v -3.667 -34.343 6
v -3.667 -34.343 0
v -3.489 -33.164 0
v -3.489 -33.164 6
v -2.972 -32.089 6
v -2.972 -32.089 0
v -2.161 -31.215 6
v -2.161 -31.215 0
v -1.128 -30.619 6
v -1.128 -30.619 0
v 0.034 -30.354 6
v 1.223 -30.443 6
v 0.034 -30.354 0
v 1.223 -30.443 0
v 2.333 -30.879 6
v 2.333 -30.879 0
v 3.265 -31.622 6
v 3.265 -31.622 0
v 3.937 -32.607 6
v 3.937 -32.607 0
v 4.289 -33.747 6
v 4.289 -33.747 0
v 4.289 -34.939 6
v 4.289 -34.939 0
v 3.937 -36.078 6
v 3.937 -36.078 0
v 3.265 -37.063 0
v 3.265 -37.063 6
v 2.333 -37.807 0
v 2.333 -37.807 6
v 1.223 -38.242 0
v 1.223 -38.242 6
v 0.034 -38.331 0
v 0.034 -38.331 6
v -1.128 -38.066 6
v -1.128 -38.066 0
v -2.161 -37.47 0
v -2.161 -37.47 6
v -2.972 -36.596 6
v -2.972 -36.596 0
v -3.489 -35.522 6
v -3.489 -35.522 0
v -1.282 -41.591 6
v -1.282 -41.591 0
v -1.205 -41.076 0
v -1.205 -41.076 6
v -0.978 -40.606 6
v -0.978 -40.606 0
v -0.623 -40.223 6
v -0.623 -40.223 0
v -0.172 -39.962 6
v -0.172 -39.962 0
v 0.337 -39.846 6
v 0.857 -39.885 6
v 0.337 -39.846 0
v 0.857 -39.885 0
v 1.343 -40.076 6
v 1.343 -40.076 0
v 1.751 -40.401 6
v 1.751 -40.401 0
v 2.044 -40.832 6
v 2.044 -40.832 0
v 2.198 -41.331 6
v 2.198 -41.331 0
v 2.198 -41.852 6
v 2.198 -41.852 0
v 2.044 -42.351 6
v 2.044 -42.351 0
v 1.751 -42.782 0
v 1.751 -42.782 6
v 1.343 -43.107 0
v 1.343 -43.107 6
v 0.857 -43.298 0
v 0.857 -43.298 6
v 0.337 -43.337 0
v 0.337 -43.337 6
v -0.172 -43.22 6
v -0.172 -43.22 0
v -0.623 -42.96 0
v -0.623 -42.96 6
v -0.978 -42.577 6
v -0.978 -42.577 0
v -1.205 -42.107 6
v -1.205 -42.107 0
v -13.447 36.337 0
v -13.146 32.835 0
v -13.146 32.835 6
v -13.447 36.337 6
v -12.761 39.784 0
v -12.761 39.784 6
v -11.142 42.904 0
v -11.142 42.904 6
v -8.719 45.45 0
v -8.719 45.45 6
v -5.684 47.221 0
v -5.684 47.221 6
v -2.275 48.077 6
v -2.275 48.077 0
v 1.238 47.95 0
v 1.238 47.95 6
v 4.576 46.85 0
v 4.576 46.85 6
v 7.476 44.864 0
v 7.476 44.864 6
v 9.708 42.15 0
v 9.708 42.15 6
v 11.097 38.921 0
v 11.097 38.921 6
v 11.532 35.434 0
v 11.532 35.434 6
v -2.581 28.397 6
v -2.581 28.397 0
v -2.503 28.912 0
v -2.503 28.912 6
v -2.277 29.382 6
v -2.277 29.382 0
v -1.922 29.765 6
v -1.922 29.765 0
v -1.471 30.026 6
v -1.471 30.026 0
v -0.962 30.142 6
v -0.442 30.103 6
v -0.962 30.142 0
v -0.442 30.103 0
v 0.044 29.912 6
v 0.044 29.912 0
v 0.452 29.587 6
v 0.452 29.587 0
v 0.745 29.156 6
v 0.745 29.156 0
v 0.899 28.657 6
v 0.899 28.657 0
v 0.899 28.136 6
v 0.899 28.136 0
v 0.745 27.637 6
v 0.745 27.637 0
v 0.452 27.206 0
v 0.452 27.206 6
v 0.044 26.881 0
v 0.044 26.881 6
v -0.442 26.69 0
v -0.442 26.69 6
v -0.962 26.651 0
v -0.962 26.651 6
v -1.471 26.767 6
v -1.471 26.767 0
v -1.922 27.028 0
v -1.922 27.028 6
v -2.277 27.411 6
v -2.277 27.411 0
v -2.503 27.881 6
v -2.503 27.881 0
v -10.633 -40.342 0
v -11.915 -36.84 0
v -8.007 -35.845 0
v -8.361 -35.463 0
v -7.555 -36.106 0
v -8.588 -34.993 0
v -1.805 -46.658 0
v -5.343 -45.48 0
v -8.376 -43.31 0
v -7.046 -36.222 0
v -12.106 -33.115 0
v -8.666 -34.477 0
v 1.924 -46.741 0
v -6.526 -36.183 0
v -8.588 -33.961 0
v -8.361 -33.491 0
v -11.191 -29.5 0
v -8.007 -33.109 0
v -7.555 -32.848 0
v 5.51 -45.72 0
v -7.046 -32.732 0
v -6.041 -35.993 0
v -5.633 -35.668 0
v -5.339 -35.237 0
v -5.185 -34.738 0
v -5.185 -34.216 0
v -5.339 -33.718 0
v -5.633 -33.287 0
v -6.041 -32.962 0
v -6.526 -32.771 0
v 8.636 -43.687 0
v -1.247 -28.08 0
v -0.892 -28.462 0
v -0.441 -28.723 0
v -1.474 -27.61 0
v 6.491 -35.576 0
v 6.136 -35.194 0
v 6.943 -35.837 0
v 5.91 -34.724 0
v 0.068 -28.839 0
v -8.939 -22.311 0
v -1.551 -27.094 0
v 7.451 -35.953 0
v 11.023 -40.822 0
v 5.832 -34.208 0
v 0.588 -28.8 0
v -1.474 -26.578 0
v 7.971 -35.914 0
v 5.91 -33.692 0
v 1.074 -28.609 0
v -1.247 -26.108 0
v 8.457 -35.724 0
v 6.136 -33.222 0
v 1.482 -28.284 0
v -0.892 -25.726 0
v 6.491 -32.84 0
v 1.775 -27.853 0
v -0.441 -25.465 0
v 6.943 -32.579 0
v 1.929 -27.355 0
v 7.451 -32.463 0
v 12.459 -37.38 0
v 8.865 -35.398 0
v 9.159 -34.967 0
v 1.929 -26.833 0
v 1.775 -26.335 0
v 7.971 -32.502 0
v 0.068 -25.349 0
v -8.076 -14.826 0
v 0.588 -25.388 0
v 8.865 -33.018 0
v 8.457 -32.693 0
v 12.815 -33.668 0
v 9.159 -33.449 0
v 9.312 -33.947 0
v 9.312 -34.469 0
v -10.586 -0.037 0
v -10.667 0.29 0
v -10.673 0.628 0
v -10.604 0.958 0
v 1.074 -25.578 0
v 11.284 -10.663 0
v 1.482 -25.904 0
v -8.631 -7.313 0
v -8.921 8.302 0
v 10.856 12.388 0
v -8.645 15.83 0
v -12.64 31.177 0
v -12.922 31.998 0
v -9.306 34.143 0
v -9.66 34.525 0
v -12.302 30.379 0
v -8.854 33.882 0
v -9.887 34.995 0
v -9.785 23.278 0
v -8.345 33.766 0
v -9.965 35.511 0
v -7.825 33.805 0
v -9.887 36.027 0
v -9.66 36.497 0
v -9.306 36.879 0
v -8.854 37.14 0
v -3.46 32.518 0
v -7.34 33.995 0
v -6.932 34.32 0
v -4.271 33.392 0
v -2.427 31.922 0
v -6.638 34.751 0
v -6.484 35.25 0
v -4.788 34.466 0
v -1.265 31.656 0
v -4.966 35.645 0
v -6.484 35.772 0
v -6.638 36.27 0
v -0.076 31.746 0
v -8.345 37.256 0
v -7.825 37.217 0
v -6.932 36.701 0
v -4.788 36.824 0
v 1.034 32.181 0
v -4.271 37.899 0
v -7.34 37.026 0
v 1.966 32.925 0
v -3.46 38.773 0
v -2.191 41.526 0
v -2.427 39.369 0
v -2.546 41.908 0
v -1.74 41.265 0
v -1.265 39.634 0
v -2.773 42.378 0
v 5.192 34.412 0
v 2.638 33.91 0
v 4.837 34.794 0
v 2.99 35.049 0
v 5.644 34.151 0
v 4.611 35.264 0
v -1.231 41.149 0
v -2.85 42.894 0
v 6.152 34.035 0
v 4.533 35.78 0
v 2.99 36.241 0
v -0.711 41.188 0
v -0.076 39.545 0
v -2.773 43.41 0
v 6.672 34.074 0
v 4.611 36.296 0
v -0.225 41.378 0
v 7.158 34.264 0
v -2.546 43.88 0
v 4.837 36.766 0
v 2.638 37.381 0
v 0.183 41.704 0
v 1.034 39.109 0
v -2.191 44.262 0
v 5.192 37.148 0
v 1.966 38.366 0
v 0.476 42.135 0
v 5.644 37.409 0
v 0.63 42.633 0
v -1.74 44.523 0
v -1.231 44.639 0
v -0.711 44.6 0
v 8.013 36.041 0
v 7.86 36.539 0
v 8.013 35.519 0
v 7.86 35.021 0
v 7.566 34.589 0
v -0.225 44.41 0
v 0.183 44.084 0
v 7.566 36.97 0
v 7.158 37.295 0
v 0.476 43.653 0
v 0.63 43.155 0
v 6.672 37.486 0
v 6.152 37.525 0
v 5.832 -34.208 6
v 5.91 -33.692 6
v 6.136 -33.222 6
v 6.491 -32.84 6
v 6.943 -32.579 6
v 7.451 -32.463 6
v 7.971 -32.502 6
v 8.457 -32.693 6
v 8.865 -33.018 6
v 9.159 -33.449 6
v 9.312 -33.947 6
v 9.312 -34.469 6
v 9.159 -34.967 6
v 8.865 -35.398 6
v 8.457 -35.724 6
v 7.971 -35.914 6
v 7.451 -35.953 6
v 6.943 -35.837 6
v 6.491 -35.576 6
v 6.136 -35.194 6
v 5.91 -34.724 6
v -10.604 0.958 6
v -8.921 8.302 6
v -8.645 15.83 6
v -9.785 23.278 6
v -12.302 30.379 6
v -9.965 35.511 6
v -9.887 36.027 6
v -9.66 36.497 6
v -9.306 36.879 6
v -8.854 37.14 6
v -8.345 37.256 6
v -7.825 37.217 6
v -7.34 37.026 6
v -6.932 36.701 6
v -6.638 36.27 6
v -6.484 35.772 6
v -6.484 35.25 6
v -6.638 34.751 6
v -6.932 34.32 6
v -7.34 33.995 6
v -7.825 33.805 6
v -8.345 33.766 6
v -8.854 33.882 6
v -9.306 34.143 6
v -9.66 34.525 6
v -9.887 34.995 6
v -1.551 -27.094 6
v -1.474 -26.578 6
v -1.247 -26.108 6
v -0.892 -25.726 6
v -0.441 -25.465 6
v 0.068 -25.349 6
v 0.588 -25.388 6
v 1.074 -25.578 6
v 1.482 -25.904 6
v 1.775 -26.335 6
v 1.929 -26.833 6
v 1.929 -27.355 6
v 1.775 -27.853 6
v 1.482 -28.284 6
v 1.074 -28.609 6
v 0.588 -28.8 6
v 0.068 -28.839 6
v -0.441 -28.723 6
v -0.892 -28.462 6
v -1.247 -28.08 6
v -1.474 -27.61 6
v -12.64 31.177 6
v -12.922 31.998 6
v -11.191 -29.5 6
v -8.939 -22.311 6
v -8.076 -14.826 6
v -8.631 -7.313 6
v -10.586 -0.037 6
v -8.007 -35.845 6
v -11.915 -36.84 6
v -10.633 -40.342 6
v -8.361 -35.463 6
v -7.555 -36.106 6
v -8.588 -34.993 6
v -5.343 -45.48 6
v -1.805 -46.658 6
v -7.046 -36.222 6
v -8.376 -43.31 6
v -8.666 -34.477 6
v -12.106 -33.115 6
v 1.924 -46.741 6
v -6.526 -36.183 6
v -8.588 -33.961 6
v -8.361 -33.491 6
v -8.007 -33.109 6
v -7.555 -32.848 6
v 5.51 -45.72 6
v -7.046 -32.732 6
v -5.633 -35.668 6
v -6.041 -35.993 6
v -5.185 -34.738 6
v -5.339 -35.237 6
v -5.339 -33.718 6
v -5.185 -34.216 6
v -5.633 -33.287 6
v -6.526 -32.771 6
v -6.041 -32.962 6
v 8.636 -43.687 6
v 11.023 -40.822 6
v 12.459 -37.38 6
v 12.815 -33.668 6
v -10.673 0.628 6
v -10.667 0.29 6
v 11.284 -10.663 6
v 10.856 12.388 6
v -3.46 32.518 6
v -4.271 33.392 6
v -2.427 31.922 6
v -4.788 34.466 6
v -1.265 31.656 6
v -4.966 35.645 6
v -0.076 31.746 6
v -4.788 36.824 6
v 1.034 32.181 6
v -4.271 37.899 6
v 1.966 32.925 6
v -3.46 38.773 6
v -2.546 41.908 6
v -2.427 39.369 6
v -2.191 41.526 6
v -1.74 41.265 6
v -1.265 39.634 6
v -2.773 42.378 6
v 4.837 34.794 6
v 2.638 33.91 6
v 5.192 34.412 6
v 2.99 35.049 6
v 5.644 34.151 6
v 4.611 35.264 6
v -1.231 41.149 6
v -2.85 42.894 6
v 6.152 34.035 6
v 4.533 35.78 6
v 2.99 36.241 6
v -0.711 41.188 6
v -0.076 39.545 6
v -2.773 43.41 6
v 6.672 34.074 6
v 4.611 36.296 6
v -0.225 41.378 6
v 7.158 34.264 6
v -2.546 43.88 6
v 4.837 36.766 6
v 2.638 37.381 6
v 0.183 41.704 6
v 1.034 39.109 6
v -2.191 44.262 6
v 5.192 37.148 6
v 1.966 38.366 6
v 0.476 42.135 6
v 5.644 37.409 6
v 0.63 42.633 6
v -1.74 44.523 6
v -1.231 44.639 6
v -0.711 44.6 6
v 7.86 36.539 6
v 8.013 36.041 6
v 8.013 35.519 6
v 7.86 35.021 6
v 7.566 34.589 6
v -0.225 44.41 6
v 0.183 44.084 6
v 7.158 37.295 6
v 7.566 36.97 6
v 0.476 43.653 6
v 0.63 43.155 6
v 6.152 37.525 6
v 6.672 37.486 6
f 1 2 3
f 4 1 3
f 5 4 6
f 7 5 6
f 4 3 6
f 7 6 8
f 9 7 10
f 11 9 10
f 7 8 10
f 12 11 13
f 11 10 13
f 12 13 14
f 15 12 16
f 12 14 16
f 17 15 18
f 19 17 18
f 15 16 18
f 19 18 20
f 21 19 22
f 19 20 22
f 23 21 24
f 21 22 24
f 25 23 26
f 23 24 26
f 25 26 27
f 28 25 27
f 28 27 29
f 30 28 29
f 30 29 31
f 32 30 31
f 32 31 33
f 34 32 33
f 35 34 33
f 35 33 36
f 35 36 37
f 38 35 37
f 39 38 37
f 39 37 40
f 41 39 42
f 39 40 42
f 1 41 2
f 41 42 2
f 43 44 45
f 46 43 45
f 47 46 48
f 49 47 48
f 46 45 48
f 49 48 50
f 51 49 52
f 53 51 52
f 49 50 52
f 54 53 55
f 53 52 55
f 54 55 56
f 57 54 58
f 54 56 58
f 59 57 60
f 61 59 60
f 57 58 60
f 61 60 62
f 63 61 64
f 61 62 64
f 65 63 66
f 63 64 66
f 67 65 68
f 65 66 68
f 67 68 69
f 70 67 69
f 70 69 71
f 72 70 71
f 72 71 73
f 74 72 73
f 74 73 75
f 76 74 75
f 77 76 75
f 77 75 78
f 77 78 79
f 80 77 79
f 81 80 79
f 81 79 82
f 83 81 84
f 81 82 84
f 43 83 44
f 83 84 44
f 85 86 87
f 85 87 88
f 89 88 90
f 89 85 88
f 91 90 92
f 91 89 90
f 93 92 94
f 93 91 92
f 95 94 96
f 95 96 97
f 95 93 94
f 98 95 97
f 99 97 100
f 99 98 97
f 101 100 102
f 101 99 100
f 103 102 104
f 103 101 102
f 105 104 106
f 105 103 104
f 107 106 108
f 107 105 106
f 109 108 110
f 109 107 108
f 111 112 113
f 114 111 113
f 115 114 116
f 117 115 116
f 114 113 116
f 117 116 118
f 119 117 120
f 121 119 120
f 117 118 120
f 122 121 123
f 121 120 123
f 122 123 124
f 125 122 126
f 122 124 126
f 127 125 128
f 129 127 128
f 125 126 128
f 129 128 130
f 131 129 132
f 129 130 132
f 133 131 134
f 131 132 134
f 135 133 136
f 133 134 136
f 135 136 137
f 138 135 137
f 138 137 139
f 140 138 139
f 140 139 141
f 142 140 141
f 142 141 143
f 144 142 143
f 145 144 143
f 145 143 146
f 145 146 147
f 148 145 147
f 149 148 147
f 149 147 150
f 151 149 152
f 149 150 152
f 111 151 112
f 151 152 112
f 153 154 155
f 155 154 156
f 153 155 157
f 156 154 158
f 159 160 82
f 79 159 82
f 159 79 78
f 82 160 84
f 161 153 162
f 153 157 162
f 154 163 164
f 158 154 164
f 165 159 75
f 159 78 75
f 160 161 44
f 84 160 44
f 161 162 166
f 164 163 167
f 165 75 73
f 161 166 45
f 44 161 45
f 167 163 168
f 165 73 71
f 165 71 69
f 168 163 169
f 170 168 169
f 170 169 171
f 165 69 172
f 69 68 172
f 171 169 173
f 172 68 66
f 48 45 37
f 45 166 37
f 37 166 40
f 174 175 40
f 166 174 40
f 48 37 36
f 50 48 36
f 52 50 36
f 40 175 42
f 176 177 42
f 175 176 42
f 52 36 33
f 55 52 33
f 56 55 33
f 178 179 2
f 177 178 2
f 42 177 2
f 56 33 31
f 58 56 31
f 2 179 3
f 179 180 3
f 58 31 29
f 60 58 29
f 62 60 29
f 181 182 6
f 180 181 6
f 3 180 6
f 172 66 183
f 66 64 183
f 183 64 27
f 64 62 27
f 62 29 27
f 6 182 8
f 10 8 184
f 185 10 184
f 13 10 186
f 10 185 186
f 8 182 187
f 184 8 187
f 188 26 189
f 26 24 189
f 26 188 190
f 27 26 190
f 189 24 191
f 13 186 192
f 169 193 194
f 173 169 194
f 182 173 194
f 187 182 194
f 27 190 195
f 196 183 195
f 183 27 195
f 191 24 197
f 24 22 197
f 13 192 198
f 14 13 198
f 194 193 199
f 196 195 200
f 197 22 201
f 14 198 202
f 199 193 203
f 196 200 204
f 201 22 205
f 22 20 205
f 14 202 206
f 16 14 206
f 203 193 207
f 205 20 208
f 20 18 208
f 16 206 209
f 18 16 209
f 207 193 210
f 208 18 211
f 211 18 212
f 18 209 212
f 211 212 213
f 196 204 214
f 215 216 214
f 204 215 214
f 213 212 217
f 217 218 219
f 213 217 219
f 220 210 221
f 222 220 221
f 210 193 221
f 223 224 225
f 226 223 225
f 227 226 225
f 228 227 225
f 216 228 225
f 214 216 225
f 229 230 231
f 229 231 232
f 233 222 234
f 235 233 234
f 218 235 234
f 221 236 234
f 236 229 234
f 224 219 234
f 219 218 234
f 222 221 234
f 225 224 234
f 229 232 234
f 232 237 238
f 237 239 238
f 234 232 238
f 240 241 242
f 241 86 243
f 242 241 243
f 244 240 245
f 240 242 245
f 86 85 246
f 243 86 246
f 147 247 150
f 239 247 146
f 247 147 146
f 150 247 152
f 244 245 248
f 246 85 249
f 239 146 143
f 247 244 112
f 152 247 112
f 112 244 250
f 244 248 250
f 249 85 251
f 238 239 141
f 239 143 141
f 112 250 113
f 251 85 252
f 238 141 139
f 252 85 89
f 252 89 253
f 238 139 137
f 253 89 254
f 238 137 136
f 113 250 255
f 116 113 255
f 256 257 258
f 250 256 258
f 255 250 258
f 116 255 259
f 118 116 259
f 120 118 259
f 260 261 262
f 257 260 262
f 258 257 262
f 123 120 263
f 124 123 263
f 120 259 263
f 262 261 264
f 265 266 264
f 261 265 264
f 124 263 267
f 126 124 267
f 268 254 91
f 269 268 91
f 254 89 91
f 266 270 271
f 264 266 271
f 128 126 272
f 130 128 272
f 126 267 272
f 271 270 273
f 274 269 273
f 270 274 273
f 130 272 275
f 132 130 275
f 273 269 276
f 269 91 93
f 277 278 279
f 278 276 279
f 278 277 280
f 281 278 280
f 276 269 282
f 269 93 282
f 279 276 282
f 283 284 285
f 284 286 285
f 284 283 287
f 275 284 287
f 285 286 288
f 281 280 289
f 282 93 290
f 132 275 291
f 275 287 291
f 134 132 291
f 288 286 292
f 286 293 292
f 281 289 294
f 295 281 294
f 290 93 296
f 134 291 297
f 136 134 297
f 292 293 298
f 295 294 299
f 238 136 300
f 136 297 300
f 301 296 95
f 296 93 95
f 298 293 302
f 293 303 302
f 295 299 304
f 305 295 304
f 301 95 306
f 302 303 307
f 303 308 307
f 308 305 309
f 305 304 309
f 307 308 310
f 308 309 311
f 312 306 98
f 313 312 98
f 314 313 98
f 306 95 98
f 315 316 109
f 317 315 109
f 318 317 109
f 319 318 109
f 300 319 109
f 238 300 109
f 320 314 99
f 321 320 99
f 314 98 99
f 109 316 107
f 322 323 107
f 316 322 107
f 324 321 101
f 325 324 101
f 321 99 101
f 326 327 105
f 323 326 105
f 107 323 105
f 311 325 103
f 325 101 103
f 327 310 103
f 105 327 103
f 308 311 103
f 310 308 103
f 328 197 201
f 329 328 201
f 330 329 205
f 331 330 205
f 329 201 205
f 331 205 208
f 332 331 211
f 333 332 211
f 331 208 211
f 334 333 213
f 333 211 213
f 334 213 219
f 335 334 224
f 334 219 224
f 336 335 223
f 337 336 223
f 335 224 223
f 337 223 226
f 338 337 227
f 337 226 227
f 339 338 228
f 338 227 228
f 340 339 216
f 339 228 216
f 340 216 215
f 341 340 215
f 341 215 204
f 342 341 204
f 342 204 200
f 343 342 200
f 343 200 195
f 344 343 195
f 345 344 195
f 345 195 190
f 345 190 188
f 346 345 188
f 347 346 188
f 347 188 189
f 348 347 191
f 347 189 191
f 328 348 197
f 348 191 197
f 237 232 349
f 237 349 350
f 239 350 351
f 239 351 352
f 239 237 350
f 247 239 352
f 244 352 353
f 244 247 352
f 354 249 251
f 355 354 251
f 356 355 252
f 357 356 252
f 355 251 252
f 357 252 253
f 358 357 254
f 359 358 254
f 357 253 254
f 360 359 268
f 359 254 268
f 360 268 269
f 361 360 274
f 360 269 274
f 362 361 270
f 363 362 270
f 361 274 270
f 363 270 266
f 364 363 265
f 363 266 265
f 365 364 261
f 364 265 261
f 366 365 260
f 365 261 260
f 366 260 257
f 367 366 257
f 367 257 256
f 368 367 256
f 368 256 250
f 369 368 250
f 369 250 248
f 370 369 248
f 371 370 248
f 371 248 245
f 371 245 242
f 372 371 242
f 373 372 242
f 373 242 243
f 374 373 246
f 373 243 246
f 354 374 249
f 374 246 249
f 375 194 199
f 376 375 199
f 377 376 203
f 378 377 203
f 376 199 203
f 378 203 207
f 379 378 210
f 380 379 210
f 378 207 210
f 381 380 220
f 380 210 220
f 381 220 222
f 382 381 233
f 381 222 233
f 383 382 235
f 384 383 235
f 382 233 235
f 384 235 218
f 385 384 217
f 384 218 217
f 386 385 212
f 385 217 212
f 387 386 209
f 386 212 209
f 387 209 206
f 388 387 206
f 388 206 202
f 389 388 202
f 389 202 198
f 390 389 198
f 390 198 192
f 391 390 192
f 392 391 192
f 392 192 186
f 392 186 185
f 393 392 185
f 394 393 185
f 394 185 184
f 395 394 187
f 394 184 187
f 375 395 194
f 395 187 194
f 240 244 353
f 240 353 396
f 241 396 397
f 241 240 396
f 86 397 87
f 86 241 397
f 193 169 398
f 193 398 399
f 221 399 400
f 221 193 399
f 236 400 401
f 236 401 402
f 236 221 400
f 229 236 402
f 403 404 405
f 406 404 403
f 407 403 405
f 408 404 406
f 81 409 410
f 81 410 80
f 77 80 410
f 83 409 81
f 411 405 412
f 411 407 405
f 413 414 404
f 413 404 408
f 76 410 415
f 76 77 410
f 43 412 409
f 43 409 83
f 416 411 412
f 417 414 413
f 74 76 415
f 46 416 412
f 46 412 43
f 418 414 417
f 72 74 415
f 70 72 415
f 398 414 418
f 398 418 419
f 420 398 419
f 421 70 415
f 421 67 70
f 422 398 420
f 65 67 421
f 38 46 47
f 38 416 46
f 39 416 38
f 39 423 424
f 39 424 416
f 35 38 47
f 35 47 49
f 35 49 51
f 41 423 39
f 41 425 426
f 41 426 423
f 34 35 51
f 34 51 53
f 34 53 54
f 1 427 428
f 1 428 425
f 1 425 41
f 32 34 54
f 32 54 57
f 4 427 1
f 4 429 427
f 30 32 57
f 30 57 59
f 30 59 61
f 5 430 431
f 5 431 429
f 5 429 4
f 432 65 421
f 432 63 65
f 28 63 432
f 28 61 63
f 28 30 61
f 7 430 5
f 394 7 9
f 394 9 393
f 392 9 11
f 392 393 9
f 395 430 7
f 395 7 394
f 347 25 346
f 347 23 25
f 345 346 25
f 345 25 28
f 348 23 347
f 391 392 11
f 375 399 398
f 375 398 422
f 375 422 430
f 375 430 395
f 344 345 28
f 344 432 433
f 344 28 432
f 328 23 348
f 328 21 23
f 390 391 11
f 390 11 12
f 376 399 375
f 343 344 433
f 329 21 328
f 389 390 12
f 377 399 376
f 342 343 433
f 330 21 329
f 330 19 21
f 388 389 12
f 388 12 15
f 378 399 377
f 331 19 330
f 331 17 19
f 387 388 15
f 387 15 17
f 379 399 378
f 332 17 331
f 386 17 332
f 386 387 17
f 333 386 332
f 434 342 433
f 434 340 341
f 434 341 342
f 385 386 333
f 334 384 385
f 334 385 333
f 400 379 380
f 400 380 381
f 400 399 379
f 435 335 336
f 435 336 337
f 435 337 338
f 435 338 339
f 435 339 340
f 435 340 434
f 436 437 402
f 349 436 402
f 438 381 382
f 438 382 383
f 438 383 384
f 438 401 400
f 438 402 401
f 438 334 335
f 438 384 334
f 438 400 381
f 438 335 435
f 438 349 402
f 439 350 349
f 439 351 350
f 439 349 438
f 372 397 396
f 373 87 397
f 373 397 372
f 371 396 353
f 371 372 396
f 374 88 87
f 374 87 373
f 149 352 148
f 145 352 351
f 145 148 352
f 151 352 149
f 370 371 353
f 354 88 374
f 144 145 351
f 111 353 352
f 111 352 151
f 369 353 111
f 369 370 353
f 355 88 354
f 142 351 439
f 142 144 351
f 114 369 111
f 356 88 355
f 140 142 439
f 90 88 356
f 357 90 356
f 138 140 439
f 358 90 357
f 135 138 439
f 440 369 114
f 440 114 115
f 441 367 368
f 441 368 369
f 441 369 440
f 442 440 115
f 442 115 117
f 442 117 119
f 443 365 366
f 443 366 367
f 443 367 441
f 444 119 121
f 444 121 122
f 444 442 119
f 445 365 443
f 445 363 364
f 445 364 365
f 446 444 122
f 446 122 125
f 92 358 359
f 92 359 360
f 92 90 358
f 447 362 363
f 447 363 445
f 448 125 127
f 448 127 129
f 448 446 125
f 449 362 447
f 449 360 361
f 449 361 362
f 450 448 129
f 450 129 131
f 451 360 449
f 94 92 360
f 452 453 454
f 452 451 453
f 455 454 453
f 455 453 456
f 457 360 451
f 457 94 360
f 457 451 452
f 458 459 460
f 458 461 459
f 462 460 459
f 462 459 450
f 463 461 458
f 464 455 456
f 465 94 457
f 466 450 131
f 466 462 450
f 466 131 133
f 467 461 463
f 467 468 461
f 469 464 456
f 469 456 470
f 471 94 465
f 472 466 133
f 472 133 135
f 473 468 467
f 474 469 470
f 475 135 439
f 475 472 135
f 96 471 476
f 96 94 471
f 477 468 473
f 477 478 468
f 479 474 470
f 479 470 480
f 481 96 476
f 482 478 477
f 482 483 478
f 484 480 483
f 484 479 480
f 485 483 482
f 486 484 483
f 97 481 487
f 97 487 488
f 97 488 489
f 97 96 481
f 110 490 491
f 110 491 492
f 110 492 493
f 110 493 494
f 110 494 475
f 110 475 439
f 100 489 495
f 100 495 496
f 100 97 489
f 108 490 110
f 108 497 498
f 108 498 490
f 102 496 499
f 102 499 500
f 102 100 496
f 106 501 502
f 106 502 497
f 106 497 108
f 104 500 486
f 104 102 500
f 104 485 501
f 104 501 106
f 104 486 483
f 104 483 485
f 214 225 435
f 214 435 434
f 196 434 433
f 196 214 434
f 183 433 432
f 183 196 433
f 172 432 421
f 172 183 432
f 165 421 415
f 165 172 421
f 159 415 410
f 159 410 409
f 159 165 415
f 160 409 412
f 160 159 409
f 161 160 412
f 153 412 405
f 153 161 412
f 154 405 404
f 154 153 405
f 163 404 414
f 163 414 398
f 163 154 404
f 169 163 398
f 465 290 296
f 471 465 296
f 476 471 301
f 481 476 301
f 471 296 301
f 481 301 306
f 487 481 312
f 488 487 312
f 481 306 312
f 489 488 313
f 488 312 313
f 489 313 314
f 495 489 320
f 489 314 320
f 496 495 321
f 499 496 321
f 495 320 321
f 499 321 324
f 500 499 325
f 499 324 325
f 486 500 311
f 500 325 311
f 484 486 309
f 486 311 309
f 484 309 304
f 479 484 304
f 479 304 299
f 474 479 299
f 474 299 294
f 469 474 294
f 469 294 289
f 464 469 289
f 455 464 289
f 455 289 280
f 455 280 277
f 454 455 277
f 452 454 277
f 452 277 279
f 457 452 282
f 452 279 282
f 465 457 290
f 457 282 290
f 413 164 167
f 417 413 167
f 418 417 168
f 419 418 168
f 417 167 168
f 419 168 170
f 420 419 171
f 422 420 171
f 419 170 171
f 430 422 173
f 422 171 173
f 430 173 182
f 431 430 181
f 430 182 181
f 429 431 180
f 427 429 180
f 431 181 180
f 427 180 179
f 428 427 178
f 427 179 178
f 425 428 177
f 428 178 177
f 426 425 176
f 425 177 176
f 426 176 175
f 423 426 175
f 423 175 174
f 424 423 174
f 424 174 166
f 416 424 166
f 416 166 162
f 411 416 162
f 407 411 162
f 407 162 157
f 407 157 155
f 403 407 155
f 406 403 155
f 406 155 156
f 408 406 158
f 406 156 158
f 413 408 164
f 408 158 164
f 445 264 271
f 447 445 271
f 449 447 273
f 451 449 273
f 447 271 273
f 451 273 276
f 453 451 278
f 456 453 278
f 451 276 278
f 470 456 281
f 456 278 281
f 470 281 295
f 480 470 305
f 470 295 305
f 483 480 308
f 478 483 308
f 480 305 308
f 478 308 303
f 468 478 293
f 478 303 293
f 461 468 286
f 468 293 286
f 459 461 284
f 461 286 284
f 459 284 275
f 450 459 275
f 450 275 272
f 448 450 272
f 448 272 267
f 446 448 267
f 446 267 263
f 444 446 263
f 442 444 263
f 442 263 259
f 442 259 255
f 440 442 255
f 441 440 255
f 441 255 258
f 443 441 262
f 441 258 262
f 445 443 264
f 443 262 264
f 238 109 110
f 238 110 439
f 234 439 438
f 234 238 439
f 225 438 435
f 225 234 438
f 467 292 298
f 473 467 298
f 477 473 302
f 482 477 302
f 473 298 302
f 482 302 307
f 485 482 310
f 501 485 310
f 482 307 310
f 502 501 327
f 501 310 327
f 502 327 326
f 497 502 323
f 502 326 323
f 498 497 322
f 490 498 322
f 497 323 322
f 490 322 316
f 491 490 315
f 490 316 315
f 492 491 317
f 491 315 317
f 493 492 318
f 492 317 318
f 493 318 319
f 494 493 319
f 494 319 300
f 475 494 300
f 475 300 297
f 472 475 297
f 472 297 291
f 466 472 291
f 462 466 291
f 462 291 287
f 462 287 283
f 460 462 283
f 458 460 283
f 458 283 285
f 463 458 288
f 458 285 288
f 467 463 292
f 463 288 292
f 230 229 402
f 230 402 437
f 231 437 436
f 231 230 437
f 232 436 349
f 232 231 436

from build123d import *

# Parameters (mm, degrees)
SKETCH1_W           = 30
SKETCH1_H           = 100
BOSS_EXTRUDE1_DEPTH = 6
SKETCH2_W           = 30
SKETCH2_H           = 100
SKETCH2_R           = 4
SKETCH2_R_2         = 1.75
CUT_EXTRUDE1_DEPTH  = 6


with BuildPart() as part:
    # Sketch1 → Boss-Extrude1 (new body)
    with BuildSketch(Plane.XY):
        Rectangle(SKETCH1_W, SKETCH1_H)
    extrude(amount=BOSS_EXTRUDE1_DEPTH)

    # Sketch2 → Cut-Extrude1 (cut)
    # profile 1 of 11: a face of its own
    with BuildSketch(Plane(origin=(0, 0, 0), x_dir=(-1, 0, 0), z_dir=(0, 0, -1))):
        Rectangle(SKETCH2_W, SKETCH2_H)
        with BuildLine():
            ThreePointArc((-11.532456366, 35.433789865), (-10.931527192, 0.86004689), (-12.814966119, -33.667586637))
            ThreePointArc((-12.814966119, -33.667586637), (1.804726533, -46.658495876), (11.190763167, -29.50036508))
            ThreePointArc((11.190763167, -29.50036508), (8.075913228, -14.826459902), (10.585521288, -0.037016008))
            ThreePointArc((10.585521288, -0.037016008), (10.679689693, 0.458946393), (10.603989757, 0.958061522))
            ThreePointArc((10.603989757, 0.958061522), (8.644900126, 15.830443683), (12.302107664, 30.37866063))
            ThreePointArc((12.302107664, 30.37866063), (12.787952713, 31.585012611), (13.145828199, 32.835314836))
            ThreePointArc((13.145828199, 32.835314836), (2.274693549, 48.076541281), (-11.532456366, 35.433789865))
        make_face(mode=Mode.SUBTRACT)
    # profile 2 of 11: a face of its own
    with BuildSketch(Plane(origin=(0, 0, 0), x_dir=(-1, 0, 0), z_dir=(0, 0, -1))):
        with Locations((0.965754671, 35.645263027)):
            Circle(SKETCH2_R)
    # profile 3 of 11: a face of its own
    with BuildSketch(Plane(origin=(0, 0, 0), x_dir=(-1, 0, 0), z_dir=(0, 0, -1))):
        with Locations((1.100290264, 42.894014656)):
            Circle(SKETCH2_R_2)
    # profile 4 of 11: a face of its own
    with BuildSketch(Plane(origin=(0, 0, 0), x_dir=(-1, 0, 0), z_dir=(0, 0, -1))):
        with Locations((8.214506299, 35.510727434)):
            Circle(SKETCH2_R_2)
    # profile 5 of 11: a face of its own
    with BuildSketch(Plane(origin=(0, 0, 0), x_dir=(-1, 0, 0), z_dir=(0, 0, -1))):
        with Locations((0.831219078, 28.396511399)):
            Circle(SKETCH2_R_2)
    # profile 6 of 11: a face of its own
    with BuildSketch(Plane(origin=(0, 0, 0), x_dir=(-1, 0, 0), z_dir=(0, 0, -1))):
        with Locations((-6.282996958, 35.77979862)):
            Circle(SKETCH2_R_2)
    # profile 7 of 11: a face of its own
    with BuildSketch(Plane(origin=(0, 0, 0), x_dir=(-1, 0, 0), z_dir=(0, 0, -1))):
        with Locations((-0.333209676, -34.342683732)):
            Circle(SKETCH2_R)
    # profile 8 of 11: a face of its own
    with BuildSketch(Plane(origin=(0, 0, 0), x_dir=(-1, 0, 0), z_dir=(0, 0, -1))):
        with Locations((-0.198674083, -27.093932103)):
            Circle(SKETCH2_R_2)
    # profile 9 of 11: a face of its own
    with BuildSketch(Plane(origin=(0, 0, 0), x_dir=(-1, 0, 0), z_dir=(0, 0, -1))):
        with Locations((6.915541953, -34.477219325)):
            Circle(SKETCH2_R_2)
    # profile 10 of 11: a face of its own
    with BuildSketch(Plane(origin=(0, 0, 0), x_dir=(-1, 0, 0), z_dir=(0, 0, -1))):
        with Locations((-7.581961304, -34.208148139)):
            Circle(SKETCH2_R_2)
    # profile 11 of 11: a face of its own
    with BuildSketch(Plane(origin=(0, 0, 0), x_dir=(-1, 0, 0), z_dir=(0, 0, -1))):
        with Locations((-0.467745269, -41.591435361)):
            Circle(SKETCH2_R_2)
    extrude(amount=-CUT_EXTRUDE1_DEPTH, mode=Mode.SUBTRACT)


solid = part.part
